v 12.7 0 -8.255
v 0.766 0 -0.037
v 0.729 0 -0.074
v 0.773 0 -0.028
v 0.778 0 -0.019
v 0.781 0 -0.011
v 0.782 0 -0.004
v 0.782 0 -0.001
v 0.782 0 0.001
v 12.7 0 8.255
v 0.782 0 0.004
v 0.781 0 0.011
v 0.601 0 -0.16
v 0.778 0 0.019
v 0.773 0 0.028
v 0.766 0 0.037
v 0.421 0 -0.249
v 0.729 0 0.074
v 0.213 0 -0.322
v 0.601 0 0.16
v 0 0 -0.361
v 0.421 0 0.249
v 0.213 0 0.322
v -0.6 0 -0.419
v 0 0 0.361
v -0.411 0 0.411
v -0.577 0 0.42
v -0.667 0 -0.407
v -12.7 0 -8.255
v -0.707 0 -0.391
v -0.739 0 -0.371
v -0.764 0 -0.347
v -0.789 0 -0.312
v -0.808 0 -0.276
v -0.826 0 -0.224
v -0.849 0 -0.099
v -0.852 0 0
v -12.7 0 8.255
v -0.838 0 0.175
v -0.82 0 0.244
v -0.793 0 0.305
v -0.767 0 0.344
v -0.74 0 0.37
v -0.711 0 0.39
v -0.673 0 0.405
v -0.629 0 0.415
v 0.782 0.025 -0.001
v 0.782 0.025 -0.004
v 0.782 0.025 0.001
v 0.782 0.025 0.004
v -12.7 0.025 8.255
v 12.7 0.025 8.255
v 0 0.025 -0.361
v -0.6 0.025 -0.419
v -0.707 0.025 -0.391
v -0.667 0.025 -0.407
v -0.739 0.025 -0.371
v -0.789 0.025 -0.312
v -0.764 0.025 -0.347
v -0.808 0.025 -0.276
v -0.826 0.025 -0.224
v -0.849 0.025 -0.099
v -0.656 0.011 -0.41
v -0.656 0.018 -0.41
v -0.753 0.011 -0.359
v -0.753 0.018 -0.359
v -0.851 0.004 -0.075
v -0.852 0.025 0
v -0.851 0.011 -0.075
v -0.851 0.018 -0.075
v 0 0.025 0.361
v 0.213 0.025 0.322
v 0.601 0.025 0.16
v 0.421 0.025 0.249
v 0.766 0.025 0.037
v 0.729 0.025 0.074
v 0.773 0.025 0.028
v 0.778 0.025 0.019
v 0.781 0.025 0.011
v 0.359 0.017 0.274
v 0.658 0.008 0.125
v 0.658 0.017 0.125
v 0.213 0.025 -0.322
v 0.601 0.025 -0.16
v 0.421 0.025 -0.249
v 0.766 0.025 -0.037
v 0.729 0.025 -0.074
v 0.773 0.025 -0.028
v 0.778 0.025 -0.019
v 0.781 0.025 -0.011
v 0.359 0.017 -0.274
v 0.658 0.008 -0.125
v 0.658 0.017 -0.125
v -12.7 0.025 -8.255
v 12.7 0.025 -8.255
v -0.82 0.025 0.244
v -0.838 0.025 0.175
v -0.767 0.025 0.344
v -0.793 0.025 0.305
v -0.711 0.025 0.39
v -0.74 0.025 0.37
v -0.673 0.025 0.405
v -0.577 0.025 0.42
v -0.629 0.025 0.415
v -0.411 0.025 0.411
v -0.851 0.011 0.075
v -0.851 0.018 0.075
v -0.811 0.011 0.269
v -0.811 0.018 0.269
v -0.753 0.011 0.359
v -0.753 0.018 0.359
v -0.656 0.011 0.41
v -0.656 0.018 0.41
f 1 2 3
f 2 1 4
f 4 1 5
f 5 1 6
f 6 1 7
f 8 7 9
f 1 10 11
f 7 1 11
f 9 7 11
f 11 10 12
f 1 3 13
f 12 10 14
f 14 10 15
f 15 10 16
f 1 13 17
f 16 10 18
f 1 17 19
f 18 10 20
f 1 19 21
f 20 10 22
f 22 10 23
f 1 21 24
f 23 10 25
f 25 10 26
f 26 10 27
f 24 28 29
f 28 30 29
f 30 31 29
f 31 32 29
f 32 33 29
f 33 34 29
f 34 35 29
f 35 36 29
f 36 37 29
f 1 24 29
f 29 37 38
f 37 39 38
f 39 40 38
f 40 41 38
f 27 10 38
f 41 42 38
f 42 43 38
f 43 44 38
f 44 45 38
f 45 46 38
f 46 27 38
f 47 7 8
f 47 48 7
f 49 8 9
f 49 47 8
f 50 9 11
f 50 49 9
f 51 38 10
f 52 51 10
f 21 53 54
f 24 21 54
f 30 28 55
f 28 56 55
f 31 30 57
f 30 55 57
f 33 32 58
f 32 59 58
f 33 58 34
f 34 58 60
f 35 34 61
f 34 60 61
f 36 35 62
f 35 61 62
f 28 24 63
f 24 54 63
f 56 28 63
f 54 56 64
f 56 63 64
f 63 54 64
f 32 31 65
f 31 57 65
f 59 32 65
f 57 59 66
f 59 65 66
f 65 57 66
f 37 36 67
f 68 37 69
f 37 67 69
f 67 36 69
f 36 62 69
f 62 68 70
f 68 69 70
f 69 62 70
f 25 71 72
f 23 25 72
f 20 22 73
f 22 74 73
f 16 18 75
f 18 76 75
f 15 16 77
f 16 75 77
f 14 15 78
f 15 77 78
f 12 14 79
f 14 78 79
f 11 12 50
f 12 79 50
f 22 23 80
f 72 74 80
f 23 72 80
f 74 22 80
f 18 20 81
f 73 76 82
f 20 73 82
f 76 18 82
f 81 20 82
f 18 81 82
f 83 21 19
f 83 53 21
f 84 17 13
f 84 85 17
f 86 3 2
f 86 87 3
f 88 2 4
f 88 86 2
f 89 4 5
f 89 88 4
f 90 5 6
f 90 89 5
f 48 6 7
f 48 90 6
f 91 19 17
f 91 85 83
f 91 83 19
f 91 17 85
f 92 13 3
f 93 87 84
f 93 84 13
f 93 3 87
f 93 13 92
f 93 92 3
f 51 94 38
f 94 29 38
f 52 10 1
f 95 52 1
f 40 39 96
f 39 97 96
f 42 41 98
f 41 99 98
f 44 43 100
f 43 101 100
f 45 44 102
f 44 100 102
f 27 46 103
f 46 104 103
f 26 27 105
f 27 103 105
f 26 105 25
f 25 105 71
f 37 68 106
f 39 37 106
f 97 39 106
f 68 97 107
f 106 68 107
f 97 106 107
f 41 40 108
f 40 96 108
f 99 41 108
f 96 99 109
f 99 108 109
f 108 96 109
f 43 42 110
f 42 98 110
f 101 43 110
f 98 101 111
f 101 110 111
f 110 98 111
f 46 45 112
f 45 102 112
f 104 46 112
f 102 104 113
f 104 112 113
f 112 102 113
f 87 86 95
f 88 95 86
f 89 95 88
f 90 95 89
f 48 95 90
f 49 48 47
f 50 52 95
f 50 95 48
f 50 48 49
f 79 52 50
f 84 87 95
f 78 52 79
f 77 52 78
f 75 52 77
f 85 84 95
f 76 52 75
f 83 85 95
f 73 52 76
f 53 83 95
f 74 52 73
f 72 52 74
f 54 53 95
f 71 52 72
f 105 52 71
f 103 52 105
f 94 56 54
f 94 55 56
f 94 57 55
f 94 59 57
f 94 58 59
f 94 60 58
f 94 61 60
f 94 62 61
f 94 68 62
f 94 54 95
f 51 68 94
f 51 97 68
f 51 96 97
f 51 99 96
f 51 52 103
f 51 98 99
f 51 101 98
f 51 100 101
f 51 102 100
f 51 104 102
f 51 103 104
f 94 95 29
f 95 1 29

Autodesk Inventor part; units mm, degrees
ref_plane "YZ Plane" through (0, 0, 0) normal (1, 0, 0) x (0, 1, 0)
ref_plane "XZ Plane" through (0, 0, 0) normal (0, 1, 0) x (-1, 0, 0)
ref_plane "XY Plane" through (0, 0, 0) normal (0, 0, 1) x (1, 0, 0)
sketch "stock_cut_for_holder" plane through (0, 0, 0) normal (0, 1, 0) x (-1, 0, 0)
  line L0 (-12.7, -8.255) -> (12.7, -8.255)
  line L1 (12.7, -8.255) -> (12.7, 8.255)
  line L2 (12.7, 8.255) -> (-12.7, 8.255)
  line L3 (-12.7, 8.255) -> (-12.7, -8.255)
  line L4 (-12.7, -8.255) -> (12.7, 8.255) construction
  line L5 (12.7, -8.255) -> (-12.7, 8.255) construction
  point P0 (0, 0)
  dimension "cut_shim_height" = 25.4
  dimension "cut_shim_width" = 16.51
extrude "Plate1" add sketch "stock_cut_for_holder" along normal blind 0.0254
sketch "mill_path" plane through (0, 0.0254, 0) normal (0, 1, 0) x (1, 0, 0)
  line L0 (12.7, 8.255) -> (12.7, -8.255) projected
  line L1 (-12.7, 8.255) -> (12.7, 8.255) projected
  line L2 (-12.7, -8.255) -> (-12.7, 8.255) projected
  line L3 (12.7, -8.255) -> (-12.7, -8.255) projected
  line L4 (-12.7, 8.255) -> (-12.7, -8.255) projected
  line L5 (-12.7, 0) -> (12.7, 0) construction
  line L6 (12.7, -8.255) -> (12.7, 8.255) projected
  line L7 (0, 0) -> (0, -0.3607) construction
  line L8 (0, 0) -> (0, 0.3607) construction
  line L9 (-0.4445, 0) -> (-0.4445, -0.4191) construction
  line L10 (-0.4445, 0) -> (-0.4445, 0.4191) construction
  line L11 (0.5334, 0) -> (0.5334, -0.1969) construction
  line L12 (-0.7888, 0) -> (-0.7888, -0.4064) construction
  line L13 (0.5334, 0) -> (0.5334, 0.1968) construction
  line L14 (-0.7888, 0) -> (-0.7888, 0.4064) construction
  line L15 (-0.6095, 0) -> (-0.6095, -0.4318) construction
  line L16 (-0.6095, 0) -> (-0.6095, 0.4318) construction
  line L17 (0.5334, 0) -> (0.5334, 0.1968) construction
  line L18 (-0.8523, 0) -> (-0.8523, -0.1397) construction
  line L19 (-0.8523, 0) -> (-0.8523, 0.1397)
  line L20 (0.762, 0) -> (0.762, -0.0419) construction
  line L21 (0.762, 0) -> (0.762, 0.0419) construction
  spline S0 degree 3 poles (0, -0.3607) (0.3564, -0.3353) (0.7999, -0.0723) (0.7811, 0) knots 0 0 0 0 1 1 1 1
  spline S1 degree 3 poles (0, 0.3607) (0.3564, 0.3353) (0.7999, 0.0723) (0.781, 0) knots 0 0 0 0 1 1 1 1
  line L22 (0, 0) -> (0, -0.275) construction
  line L23 (0, 0.3607) -> (-0.4445, 0.4191) construction
  line L24 (-0.4445, 0.4191) -> (-0.6095, 0.4318) construction
  line L25 (-0.6095, 0.4318) -> (-0.7888, 0.4064) construction
  line L26 (-0.7888, 0.4064) -> (-0.8523, 0.1397) construction
  line L27 (-0.8523, 0.1397) -> (-0.8561, 0) construction
  line L28 (-0.8561, 0) -> (-0.8523, -0.1397) construction
  line L29 (-0.8523, -0.1397) -> (-0.7888, -0.4064) construction
  line L30 (-0.7888, -0.4064) -> (-0.6095, -0.4318) construction
  line L31 (-0.6095, -0.4318) -> (-0.4445, -0.4191) construction
  line L32 (-0.4445, -0.4191) -> (0, -0.3607) construction
  spline S2 degree 4 poles (0, 0.3607) (-0.4445, 0.4191) (-0.6095, 0.4318) (-0.7888, 0.4064) (-0.8523, 0.1397) (-0.8561, 0) (-0.8523, -0.1397) (-0.7888, -0.4064) (-0.6095, -0.4318) (-0.4445, -0.4191) (0, -0.3607) knots 1 1 1 1 1 2 3 4 5 6 7 8 8 8 8 8
  dimension "half_mid_thorax_width" = 0.3607
  dimension "mid_thorax_to_prescutum" = 0.4445
  dimension "w2" = 0.4191
  dimension "d9" = 0.1968
  dimension "mid_thorax_to_anterior_scutellum" = 0.5334
  dimension "d11" = 0.4064
  dimension "d13" = 0.4318
  dimension "head_thorax" = 0.165
  dimension "d15" = 0.1793
  dimension "d17" = 0.1397
  dimension "d18" = 0.0635
  dimension "scutellum_taper" = 0.2286
  dimension "d20" = 0.0419
  dimension "d21" = 0.0191
  dimension "d22" = 0.0038
  dimension "d24" = 0.4078
  dimension "d25" = 1.6372
extrude "milled_hole" cut sketch "mill_path" against normal blind 0.0254 contours S2 S1 S0
fillet "Corner Round5" radius 0.127 1 edges at (0.7811, 0.0127, 0)
equation "\"d26\" = Thickness"
equation "\"BendRadius\" = Thickness"
equation "\"BendReliefWidth\" = Thickness"
equation "\"BendReliefDepth\" = 0.5 * Thickness"
equation "\"CornerReliefSize\" = 4 * Thickness"
equation "\"MinimumRemnant\" = 2 * Thickness"
equation "\"TransitionRadius\" = BendRadius"
equation "\"JacobiRadiusSize\" = BendRadius"
equation "\"GapSize\" = Thickness"
equation "\"d2\" = BendRadius"
equation "\"Thickness\" = 0.0254"
properties part number "antennal_lobe_v01_kumato" material "Stainless Steel AISI 317"
